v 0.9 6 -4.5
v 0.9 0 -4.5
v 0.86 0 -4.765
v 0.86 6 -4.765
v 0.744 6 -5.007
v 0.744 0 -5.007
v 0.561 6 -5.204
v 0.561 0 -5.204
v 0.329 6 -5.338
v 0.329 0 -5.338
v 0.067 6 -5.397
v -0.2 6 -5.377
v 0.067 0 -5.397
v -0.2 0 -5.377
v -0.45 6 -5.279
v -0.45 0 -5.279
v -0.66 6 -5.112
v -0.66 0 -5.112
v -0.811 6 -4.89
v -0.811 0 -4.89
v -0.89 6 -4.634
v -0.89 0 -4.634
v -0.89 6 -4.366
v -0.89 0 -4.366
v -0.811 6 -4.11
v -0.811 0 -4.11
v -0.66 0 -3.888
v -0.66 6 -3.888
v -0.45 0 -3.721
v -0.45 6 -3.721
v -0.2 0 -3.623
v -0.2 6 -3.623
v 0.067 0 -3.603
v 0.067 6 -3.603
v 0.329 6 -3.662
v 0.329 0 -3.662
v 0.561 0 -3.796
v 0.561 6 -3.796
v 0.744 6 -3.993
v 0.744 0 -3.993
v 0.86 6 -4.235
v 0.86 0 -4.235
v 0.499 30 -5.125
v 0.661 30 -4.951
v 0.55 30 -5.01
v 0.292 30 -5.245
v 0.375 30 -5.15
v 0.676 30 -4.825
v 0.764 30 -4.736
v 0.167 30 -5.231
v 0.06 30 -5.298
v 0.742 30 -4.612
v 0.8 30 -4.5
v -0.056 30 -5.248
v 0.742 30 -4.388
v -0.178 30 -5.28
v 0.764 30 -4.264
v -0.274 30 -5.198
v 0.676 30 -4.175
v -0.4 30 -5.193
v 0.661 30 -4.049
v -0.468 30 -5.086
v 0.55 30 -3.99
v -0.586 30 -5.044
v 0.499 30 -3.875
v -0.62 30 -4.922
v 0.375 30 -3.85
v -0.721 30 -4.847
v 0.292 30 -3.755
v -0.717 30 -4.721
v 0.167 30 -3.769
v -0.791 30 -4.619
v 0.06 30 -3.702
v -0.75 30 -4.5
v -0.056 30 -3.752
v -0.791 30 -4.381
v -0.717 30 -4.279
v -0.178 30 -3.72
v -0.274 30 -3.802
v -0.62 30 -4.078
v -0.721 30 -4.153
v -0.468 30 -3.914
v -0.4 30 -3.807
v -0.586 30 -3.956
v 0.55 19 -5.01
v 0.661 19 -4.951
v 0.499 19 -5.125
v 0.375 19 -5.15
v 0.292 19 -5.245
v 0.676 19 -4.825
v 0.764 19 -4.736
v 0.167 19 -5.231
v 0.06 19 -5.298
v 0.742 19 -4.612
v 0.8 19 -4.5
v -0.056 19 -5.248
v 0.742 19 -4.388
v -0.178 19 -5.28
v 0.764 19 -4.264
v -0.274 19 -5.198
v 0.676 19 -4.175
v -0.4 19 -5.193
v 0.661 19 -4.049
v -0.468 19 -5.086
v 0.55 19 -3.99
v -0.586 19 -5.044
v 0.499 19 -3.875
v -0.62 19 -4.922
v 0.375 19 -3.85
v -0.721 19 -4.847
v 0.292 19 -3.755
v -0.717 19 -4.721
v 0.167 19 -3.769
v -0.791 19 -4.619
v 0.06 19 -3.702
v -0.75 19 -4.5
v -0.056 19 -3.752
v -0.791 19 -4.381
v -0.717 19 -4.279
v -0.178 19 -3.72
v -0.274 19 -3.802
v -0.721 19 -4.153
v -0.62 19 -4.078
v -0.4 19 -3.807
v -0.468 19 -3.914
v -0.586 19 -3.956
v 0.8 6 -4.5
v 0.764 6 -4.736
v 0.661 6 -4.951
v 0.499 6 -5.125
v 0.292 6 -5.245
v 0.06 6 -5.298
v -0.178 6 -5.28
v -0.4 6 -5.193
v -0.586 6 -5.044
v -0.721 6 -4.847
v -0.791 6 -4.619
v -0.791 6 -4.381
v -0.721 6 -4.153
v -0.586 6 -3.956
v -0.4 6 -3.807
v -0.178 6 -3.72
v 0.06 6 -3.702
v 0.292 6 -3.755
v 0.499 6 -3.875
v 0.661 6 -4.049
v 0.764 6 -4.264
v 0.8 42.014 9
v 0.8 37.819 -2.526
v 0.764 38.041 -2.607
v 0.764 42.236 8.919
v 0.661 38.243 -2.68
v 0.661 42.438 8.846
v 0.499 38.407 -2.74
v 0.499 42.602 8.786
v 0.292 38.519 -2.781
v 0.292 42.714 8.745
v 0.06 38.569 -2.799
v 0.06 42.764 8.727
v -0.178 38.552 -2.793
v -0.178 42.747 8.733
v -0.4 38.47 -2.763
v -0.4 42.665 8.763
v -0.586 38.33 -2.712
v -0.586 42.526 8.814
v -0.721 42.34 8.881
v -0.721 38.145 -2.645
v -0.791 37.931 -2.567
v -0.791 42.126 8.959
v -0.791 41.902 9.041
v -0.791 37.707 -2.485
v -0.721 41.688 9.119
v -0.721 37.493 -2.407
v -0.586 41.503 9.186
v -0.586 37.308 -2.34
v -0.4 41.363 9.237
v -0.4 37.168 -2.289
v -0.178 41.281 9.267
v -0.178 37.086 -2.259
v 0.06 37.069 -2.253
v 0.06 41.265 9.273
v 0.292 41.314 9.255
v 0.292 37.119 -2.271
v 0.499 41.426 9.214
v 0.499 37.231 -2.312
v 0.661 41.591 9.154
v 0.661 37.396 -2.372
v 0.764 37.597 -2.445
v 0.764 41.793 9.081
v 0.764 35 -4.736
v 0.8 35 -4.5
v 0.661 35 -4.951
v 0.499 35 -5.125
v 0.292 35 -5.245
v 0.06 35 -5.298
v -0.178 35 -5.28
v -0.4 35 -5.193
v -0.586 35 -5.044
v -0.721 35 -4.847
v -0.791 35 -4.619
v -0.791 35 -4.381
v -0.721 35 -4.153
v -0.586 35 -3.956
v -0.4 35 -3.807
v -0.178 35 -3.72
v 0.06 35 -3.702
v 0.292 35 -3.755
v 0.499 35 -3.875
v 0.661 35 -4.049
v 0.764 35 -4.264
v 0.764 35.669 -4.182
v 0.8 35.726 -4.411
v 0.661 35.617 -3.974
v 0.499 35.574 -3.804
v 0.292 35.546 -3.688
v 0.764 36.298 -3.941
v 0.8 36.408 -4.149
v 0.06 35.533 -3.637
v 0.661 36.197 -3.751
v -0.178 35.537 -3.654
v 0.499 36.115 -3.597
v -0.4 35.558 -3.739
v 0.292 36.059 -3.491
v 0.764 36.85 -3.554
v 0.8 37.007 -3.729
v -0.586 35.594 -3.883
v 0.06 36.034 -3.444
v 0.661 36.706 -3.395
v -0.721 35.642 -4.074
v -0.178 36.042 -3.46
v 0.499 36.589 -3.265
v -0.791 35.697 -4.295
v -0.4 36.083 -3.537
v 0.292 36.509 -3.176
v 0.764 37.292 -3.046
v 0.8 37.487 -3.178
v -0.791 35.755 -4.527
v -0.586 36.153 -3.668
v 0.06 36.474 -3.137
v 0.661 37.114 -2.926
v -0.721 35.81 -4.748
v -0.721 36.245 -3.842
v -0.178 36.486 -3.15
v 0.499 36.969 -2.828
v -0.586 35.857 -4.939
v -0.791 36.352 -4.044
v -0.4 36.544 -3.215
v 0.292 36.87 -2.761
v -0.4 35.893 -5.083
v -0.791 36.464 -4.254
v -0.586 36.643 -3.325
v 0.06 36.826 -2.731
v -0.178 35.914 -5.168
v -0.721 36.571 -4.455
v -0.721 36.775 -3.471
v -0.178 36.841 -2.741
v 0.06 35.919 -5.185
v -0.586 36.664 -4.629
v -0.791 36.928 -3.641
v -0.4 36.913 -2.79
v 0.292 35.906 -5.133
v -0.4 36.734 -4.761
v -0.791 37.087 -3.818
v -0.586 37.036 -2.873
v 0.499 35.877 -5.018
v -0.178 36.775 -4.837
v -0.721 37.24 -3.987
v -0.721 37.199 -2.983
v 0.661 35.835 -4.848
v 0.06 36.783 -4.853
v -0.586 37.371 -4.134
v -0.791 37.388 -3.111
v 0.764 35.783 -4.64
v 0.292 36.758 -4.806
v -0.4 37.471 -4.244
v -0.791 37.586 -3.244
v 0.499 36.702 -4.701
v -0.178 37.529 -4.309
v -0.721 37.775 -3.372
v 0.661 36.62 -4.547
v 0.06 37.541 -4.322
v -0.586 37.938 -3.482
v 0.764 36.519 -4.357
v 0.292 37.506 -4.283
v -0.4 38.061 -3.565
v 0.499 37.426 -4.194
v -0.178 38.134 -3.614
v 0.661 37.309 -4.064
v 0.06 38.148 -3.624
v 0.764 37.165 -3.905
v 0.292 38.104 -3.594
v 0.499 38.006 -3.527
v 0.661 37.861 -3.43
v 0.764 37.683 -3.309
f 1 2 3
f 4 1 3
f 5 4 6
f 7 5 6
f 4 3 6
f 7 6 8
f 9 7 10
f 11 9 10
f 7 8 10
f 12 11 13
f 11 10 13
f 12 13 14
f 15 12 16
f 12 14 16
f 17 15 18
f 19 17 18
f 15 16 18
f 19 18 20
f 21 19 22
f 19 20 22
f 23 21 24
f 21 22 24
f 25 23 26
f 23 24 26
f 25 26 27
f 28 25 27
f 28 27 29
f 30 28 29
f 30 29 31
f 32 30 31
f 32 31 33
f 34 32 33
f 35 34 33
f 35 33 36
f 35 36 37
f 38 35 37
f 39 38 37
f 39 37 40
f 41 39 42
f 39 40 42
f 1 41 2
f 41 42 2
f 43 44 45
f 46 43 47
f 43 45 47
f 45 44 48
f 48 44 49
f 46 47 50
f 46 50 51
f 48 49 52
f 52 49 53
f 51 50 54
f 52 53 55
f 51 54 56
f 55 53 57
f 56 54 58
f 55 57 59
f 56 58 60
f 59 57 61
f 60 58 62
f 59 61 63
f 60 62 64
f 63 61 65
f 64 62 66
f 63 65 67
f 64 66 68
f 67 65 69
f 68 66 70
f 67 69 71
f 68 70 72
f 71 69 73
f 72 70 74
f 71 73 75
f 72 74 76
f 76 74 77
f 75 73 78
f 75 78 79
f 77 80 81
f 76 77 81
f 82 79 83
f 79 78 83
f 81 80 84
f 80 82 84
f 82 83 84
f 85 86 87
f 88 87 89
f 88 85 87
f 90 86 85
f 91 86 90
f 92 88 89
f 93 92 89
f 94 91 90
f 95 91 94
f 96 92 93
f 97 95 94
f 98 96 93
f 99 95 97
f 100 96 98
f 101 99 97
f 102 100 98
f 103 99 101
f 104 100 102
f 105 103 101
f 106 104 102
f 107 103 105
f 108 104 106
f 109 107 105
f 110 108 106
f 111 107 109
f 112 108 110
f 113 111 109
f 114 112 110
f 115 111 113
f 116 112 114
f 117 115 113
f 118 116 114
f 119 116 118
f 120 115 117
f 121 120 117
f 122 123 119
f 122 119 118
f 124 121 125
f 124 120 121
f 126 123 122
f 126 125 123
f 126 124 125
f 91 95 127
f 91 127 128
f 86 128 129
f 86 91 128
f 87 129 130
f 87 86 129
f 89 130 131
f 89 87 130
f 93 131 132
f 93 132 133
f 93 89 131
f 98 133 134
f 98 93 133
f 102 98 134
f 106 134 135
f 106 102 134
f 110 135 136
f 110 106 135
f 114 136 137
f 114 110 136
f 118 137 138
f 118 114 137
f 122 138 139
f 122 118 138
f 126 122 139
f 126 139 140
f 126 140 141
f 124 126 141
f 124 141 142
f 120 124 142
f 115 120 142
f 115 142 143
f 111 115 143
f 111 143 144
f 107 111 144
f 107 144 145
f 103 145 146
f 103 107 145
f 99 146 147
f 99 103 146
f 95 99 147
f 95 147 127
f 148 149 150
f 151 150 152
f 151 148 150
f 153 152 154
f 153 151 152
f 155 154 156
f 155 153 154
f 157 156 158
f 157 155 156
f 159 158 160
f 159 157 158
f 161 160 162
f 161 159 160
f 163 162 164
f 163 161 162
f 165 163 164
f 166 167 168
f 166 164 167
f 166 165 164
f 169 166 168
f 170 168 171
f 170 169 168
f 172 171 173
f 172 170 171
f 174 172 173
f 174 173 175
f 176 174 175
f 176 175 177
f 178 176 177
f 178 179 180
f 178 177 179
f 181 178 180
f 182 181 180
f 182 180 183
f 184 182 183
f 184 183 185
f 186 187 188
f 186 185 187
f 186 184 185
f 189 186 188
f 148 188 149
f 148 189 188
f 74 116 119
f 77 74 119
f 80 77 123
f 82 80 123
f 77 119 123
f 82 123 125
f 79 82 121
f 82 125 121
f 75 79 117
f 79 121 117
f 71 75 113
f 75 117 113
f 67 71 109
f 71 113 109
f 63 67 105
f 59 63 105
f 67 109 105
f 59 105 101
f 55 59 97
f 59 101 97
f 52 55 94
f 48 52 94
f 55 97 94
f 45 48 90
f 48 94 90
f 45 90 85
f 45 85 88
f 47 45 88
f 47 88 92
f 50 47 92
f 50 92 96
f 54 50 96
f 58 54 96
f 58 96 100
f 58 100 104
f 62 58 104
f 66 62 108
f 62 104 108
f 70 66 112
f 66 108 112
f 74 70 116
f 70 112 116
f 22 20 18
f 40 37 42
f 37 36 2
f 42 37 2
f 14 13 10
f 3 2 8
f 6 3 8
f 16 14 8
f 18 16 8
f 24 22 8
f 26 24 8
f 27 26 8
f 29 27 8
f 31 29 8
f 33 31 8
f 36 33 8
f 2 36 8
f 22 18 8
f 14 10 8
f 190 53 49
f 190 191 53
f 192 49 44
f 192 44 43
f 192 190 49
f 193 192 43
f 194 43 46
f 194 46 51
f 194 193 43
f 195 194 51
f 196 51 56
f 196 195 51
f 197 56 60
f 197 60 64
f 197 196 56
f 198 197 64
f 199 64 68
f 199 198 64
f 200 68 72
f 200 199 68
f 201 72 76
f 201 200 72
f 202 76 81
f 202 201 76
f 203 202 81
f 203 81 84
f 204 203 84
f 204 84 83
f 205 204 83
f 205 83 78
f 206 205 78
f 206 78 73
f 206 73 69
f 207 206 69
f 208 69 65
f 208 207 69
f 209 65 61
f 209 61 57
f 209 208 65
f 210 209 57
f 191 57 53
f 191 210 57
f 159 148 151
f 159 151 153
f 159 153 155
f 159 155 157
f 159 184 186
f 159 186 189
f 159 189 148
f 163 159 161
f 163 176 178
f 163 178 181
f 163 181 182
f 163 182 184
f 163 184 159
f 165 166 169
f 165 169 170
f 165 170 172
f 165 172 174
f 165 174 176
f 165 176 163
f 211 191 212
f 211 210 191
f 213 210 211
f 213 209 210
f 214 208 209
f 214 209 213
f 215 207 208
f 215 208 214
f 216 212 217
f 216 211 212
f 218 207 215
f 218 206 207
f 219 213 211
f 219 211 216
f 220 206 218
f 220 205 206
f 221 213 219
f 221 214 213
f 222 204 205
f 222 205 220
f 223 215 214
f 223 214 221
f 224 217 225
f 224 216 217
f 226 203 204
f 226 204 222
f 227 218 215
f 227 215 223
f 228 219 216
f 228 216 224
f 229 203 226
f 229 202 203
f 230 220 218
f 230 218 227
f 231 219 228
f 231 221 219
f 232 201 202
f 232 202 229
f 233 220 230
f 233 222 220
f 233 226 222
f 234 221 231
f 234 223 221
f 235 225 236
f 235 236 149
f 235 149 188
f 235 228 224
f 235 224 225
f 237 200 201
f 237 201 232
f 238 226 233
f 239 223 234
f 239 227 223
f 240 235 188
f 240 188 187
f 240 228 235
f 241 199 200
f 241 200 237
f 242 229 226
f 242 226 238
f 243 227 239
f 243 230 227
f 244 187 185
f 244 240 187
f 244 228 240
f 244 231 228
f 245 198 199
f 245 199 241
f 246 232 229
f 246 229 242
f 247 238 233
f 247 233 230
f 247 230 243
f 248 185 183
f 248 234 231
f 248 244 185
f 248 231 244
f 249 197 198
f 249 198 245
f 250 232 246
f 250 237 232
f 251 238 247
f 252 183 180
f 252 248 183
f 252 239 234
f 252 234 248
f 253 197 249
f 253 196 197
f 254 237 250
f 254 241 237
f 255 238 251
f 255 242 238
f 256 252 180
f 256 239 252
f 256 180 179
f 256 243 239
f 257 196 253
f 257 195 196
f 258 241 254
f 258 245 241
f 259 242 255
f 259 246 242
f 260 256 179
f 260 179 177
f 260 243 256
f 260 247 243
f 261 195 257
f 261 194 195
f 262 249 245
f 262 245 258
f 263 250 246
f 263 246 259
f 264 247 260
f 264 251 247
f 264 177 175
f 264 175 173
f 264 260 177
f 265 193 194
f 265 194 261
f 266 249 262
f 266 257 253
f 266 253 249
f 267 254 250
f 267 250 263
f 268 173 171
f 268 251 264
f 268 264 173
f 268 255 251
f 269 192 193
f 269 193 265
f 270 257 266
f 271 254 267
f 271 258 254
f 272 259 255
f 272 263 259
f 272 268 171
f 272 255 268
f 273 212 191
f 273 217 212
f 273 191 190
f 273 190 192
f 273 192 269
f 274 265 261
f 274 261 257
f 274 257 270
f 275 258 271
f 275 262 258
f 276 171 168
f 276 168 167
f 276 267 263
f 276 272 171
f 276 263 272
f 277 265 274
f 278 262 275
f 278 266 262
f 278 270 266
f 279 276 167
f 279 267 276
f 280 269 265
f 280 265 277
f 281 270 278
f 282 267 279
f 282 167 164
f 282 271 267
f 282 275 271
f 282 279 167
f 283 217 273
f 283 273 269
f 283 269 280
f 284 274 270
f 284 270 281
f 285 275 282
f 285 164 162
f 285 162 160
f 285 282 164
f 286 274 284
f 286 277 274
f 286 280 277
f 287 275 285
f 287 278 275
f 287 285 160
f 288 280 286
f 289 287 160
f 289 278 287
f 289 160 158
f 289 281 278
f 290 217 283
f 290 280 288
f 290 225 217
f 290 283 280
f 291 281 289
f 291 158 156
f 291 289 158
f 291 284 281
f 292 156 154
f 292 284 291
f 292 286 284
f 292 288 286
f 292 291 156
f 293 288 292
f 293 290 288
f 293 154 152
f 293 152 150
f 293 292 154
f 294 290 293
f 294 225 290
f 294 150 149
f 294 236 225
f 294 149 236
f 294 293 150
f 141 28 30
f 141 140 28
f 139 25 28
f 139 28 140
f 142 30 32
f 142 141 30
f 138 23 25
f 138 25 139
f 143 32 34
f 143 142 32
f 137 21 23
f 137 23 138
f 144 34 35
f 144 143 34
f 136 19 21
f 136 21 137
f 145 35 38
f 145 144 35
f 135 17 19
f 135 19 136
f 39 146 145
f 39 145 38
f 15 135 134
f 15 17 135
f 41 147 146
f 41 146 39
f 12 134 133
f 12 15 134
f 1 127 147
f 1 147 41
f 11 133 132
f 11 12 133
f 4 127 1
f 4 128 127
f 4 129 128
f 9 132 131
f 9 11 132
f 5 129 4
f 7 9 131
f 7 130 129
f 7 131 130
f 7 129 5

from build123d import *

# Parameters (mm, degrees)
SKETCH2_R         = 0.8
SKETCH4_R         = 0.9
EXTRUDE1_DEPTH    = 6
SKETCH5_OUTSIDE_W = 12.85
SKETCH5_OUTSIDE_H = 25.724
SKETCH5_OUTSIDE_R = 0.75
EXTRUDE3_DEPTH    = 11


with BuildPart() as part:
    # Sweep1: sweep along a path in Sketch1
    with BuildLine(Plane(origin=(0, 0, 0), x_dir=(0, 0, -1), z_dir=(1, 0, 0))) as sweep1_path:
        Line((4.5, 0), (4.5, 35))
        ThreePointArc((4.5, 35), (3.957456133, 36.720729309), (2.52606043, 37.819077862))
        Line((2.52606043, 37.819077862), (-9, 42.014220777))
    # Sketch2 → Sweep1 (sweep)
    with BuildSketch(Plane(origin=(0, 0, 0), x_dir=(1, 0, 0), z_dir=(0, 1, 0))):
        with Locations((0, 4.5)):
            Circle(SKETCH2_R)
    sweep(path=sweep1_path.line)

    # Sketch4 → Extrude1 (add)
    with BuildSketch(Plane(origin=(0, 0, 0), x_dir=(1, 0, 0), z_dir=(0, 1, 0))):
        with Locations((0, 4.5)):
            Circle(SKETCH4_R)
    extrude(amount=EXTRUDE1_DEPTH)

    # Sketch5 outside → Extrude3 (cut)
    with BuildSketch(Plane(origin=(0, 19, 0), x_dir=(-1, 0, 0), z_dir=(0, 1, 0))):
        with Locations((0, 1.937)):
            Rectangle(SKETCH5_OUTSIDE_W, SKETCH5_OUTSIDE_H)
        with Locations((0, -4.5)):
            Circle(SKETCH5_OUTSIDE_R, mode=Mode.SUBTRACT)
    extrude(amount=EXTRUDE3_DEPTH, mode=Mode.SUBTRACT)


solid = part.part
